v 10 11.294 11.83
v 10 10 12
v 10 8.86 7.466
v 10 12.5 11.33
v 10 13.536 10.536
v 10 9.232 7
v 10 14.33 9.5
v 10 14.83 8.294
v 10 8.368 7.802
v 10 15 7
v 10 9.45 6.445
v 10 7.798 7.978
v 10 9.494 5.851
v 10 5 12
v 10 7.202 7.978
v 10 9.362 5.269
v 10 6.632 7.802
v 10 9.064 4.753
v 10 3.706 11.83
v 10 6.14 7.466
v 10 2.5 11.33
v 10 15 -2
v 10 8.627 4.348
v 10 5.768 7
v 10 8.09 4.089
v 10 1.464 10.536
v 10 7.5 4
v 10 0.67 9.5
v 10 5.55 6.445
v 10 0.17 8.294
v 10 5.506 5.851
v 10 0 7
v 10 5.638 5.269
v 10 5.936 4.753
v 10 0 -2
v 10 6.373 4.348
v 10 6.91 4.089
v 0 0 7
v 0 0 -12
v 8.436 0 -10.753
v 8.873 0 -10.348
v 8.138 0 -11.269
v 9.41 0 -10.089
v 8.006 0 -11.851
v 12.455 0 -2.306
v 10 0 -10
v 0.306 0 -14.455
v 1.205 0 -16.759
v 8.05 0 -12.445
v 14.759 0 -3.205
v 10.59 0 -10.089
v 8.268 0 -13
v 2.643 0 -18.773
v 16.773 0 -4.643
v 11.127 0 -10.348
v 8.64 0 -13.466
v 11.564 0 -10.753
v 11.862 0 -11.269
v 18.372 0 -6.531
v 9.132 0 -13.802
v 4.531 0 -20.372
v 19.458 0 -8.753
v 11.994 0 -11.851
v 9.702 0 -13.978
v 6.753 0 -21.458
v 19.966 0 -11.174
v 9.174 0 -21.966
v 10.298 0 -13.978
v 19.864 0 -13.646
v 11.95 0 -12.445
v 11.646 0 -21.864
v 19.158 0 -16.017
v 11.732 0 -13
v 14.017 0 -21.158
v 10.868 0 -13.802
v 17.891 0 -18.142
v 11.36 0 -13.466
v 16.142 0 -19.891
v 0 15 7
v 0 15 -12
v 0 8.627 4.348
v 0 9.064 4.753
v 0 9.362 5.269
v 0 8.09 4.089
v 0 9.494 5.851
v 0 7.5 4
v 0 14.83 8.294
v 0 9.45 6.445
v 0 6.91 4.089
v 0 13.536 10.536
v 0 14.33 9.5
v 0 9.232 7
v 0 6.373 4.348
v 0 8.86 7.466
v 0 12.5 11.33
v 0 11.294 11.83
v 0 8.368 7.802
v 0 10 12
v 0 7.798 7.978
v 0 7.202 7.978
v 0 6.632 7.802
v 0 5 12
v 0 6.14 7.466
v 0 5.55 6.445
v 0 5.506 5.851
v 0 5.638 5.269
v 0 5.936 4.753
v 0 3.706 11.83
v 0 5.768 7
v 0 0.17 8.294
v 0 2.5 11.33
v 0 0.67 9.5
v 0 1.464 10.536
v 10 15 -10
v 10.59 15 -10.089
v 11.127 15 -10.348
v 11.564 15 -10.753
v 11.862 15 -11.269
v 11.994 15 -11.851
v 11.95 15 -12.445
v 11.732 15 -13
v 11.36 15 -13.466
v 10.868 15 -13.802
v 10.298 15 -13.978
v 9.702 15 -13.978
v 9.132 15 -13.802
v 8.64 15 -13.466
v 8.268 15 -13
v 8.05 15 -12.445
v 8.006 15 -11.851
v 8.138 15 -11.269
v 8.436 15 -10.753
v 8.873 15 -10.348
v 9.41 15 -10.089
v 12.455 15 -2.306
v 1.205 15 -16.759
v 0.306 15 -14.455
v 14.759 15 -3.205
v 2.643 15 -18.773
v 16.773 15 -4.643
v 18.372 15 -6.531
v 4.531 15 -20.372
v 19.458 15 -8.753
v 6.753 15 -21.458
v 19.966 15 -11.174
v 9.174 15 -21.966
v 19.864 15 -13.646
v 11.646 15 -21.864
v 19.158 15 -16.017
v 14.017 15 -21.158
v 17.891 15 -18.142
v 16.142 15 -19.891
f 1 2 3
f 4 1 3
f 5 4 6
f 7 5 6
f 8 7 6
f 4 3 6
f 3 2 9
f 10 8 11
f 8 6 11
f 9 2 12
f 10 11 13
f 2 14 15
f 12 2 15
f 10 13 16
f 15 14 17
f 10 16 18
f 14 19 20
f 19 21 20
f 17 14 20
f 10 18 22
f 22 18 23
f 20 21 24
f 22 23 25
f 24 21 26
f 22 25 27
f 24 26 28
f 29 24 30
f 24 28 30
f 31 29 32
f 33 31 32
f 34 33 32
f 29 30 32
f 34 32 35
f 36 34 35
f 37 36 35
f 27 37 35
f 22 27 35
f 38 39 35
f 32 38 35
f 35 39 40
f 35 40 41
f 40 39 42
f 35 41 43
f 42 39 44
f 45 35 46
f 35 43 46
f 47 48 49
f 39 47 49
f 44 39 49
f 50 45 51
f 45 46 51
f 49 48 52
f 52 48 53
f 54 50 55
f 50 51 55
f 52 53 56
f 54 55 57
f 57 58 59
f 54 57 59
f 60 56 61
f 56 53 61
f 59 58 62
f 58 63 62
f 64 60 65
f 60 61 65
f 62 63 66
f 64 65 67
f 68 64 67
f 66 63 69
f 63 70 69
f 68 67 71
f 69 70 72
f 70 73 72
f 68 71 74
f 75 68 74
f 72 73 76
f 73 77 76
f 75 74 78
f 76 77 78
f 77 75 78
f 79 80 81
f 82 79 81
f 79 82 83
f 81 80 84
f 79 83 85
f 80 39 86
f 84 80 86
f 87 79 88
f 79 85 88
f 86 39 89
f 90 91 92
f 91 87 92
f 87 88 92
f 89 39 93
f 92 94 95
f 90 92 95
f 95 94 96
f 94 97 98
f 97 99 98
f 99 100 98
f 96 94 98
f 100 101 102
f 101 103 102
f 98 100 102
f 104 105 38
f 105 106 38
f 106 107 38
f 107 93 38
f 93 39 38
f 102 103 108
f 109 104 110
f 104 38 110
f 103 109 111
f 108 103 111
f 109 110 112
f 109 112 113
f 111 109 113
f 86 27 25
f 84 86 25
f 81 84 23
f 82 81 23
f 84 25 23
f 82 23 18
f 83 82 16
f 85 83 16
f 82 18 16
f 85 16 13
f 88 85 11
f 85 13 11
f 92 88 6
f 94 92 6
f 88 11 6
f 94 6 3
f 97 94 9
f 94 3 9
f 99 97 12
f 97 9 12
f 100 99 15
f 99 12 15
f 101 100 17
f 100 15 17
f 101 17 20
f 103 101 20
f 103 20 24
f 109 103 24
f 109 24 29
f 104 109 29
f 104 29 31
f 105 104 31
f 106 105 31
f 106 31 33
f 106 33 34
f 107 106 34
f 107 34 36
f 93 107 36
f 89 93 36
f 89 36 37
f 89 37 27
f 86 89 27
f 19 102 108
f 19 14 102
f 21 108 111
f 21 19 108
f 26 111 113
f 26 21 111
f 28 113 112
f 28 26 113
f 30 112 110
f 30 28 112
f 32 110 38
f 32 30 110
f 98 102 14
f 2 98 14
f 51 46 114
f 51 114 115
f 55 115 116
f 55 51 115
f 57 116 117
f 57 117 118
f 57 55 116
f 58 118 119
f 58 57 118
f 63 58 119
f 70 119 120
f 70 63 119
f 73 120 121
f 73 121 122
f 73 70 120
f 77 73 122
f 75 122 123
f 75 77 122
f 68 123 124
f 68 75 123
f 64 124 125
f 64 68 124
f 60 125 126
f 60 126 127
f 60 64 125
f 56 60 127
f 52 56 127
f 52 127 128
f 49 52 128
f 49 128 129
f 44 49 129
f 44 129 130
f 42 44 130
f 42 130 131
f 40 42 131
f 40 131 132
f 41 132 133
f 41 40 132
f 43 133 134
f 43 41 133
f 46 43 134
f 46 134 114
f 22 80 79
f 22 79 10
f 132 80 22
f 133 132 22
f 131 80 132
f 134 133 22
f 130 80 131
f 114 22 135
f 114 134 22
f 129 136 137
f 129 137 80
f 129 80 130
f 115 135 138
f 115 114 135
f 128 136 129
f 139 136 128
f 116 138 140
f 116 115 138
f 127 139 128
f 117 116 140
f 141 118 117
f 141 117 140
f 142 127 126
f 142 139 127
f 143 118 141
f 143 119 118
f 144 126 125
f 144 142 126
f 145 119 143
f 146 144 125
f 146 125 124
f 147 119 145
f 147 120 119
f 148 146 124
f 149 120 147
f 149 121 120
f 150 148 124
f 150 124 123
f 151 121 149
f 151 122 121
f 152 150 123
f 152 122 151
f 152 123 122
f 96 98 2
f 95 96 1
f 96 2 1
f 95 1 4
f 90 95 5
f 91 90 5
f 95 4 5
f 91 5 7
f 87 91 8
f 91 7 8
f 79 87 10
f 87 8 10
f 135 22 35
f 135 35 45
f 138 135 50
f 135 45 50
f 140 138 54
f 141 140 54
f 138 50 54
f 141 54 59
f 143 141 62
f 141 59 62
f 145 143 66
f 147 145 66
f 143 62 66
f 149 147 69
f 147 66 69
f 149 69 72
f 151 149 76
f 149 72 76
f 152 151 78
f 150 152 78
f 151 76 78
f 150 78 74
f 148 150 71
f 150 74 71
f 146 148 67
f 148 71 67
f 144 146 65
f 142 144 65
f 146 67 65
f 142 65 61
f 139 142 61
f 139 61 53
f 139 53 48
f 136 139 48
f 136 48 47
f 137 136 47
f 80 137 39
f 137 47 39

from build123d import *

# Parameters (mm, degrees)
SKIZZE1_R                       = 2
AUFSATZ_LINEAR_AUSTRAGEN1_DEPTH = 15
VERRUNDUNG1_R                   = 5
SKIZZE2_R                       = 2
SCHNITT_LINEAR_AUSTRAGEN1_DEPTH = 29.442925307


with BuildPart() as part:
    # Skizze1 → Aufsatz-Linear austragen1 (new body)
    with BuildSketch(Plane(origin=(0, 0, 0), x_dir=(1, 0, 0), z_dir=(0, 1, 0))):
        with BuildLine():
            Line((0, 12), (0, -12))
            Line((0, -12), (10, -12))
            Line((10, -12), (10, 2))
            ThreePointArc((10, 2), (17.071067812, 19.071067812), (0, 12))
        make_face()
        with Locations(Location((10, 12, 0), (0, 0, 270))):
            Circle(SKIZZE1_R, mode=Mode.SUBTRACT)
    extrude(amount=AUFSATZ_LINEAR_AUSTRAGEN1_DEPTH)

    # Verrundung1
    verrundung1_edges = [part.edges().sort_by_distance(p)[0] for p in [
        (5, 15, 12),
        (5, 0, 12),
    ]]
    fillet(verrundung1_edges, radius=VERRUNDUNG1_R)

    # Skizze2 → Schnitt-Linear austragen1 (cut, through all)
    with BuildSketch(Plane(origin=(10, 0, 0), x_dir=(0, 0, -1), z_dir=(1, 0, 0))):
        with Locations((-6, 7.5)):
            Circle(SKIZZE2_R)
    extrude(amount=-SCHNITT_LINEAR_AUSTRAGEN1_DEPTH, mode=Mode.SUBTRACT)


solid = part.part
